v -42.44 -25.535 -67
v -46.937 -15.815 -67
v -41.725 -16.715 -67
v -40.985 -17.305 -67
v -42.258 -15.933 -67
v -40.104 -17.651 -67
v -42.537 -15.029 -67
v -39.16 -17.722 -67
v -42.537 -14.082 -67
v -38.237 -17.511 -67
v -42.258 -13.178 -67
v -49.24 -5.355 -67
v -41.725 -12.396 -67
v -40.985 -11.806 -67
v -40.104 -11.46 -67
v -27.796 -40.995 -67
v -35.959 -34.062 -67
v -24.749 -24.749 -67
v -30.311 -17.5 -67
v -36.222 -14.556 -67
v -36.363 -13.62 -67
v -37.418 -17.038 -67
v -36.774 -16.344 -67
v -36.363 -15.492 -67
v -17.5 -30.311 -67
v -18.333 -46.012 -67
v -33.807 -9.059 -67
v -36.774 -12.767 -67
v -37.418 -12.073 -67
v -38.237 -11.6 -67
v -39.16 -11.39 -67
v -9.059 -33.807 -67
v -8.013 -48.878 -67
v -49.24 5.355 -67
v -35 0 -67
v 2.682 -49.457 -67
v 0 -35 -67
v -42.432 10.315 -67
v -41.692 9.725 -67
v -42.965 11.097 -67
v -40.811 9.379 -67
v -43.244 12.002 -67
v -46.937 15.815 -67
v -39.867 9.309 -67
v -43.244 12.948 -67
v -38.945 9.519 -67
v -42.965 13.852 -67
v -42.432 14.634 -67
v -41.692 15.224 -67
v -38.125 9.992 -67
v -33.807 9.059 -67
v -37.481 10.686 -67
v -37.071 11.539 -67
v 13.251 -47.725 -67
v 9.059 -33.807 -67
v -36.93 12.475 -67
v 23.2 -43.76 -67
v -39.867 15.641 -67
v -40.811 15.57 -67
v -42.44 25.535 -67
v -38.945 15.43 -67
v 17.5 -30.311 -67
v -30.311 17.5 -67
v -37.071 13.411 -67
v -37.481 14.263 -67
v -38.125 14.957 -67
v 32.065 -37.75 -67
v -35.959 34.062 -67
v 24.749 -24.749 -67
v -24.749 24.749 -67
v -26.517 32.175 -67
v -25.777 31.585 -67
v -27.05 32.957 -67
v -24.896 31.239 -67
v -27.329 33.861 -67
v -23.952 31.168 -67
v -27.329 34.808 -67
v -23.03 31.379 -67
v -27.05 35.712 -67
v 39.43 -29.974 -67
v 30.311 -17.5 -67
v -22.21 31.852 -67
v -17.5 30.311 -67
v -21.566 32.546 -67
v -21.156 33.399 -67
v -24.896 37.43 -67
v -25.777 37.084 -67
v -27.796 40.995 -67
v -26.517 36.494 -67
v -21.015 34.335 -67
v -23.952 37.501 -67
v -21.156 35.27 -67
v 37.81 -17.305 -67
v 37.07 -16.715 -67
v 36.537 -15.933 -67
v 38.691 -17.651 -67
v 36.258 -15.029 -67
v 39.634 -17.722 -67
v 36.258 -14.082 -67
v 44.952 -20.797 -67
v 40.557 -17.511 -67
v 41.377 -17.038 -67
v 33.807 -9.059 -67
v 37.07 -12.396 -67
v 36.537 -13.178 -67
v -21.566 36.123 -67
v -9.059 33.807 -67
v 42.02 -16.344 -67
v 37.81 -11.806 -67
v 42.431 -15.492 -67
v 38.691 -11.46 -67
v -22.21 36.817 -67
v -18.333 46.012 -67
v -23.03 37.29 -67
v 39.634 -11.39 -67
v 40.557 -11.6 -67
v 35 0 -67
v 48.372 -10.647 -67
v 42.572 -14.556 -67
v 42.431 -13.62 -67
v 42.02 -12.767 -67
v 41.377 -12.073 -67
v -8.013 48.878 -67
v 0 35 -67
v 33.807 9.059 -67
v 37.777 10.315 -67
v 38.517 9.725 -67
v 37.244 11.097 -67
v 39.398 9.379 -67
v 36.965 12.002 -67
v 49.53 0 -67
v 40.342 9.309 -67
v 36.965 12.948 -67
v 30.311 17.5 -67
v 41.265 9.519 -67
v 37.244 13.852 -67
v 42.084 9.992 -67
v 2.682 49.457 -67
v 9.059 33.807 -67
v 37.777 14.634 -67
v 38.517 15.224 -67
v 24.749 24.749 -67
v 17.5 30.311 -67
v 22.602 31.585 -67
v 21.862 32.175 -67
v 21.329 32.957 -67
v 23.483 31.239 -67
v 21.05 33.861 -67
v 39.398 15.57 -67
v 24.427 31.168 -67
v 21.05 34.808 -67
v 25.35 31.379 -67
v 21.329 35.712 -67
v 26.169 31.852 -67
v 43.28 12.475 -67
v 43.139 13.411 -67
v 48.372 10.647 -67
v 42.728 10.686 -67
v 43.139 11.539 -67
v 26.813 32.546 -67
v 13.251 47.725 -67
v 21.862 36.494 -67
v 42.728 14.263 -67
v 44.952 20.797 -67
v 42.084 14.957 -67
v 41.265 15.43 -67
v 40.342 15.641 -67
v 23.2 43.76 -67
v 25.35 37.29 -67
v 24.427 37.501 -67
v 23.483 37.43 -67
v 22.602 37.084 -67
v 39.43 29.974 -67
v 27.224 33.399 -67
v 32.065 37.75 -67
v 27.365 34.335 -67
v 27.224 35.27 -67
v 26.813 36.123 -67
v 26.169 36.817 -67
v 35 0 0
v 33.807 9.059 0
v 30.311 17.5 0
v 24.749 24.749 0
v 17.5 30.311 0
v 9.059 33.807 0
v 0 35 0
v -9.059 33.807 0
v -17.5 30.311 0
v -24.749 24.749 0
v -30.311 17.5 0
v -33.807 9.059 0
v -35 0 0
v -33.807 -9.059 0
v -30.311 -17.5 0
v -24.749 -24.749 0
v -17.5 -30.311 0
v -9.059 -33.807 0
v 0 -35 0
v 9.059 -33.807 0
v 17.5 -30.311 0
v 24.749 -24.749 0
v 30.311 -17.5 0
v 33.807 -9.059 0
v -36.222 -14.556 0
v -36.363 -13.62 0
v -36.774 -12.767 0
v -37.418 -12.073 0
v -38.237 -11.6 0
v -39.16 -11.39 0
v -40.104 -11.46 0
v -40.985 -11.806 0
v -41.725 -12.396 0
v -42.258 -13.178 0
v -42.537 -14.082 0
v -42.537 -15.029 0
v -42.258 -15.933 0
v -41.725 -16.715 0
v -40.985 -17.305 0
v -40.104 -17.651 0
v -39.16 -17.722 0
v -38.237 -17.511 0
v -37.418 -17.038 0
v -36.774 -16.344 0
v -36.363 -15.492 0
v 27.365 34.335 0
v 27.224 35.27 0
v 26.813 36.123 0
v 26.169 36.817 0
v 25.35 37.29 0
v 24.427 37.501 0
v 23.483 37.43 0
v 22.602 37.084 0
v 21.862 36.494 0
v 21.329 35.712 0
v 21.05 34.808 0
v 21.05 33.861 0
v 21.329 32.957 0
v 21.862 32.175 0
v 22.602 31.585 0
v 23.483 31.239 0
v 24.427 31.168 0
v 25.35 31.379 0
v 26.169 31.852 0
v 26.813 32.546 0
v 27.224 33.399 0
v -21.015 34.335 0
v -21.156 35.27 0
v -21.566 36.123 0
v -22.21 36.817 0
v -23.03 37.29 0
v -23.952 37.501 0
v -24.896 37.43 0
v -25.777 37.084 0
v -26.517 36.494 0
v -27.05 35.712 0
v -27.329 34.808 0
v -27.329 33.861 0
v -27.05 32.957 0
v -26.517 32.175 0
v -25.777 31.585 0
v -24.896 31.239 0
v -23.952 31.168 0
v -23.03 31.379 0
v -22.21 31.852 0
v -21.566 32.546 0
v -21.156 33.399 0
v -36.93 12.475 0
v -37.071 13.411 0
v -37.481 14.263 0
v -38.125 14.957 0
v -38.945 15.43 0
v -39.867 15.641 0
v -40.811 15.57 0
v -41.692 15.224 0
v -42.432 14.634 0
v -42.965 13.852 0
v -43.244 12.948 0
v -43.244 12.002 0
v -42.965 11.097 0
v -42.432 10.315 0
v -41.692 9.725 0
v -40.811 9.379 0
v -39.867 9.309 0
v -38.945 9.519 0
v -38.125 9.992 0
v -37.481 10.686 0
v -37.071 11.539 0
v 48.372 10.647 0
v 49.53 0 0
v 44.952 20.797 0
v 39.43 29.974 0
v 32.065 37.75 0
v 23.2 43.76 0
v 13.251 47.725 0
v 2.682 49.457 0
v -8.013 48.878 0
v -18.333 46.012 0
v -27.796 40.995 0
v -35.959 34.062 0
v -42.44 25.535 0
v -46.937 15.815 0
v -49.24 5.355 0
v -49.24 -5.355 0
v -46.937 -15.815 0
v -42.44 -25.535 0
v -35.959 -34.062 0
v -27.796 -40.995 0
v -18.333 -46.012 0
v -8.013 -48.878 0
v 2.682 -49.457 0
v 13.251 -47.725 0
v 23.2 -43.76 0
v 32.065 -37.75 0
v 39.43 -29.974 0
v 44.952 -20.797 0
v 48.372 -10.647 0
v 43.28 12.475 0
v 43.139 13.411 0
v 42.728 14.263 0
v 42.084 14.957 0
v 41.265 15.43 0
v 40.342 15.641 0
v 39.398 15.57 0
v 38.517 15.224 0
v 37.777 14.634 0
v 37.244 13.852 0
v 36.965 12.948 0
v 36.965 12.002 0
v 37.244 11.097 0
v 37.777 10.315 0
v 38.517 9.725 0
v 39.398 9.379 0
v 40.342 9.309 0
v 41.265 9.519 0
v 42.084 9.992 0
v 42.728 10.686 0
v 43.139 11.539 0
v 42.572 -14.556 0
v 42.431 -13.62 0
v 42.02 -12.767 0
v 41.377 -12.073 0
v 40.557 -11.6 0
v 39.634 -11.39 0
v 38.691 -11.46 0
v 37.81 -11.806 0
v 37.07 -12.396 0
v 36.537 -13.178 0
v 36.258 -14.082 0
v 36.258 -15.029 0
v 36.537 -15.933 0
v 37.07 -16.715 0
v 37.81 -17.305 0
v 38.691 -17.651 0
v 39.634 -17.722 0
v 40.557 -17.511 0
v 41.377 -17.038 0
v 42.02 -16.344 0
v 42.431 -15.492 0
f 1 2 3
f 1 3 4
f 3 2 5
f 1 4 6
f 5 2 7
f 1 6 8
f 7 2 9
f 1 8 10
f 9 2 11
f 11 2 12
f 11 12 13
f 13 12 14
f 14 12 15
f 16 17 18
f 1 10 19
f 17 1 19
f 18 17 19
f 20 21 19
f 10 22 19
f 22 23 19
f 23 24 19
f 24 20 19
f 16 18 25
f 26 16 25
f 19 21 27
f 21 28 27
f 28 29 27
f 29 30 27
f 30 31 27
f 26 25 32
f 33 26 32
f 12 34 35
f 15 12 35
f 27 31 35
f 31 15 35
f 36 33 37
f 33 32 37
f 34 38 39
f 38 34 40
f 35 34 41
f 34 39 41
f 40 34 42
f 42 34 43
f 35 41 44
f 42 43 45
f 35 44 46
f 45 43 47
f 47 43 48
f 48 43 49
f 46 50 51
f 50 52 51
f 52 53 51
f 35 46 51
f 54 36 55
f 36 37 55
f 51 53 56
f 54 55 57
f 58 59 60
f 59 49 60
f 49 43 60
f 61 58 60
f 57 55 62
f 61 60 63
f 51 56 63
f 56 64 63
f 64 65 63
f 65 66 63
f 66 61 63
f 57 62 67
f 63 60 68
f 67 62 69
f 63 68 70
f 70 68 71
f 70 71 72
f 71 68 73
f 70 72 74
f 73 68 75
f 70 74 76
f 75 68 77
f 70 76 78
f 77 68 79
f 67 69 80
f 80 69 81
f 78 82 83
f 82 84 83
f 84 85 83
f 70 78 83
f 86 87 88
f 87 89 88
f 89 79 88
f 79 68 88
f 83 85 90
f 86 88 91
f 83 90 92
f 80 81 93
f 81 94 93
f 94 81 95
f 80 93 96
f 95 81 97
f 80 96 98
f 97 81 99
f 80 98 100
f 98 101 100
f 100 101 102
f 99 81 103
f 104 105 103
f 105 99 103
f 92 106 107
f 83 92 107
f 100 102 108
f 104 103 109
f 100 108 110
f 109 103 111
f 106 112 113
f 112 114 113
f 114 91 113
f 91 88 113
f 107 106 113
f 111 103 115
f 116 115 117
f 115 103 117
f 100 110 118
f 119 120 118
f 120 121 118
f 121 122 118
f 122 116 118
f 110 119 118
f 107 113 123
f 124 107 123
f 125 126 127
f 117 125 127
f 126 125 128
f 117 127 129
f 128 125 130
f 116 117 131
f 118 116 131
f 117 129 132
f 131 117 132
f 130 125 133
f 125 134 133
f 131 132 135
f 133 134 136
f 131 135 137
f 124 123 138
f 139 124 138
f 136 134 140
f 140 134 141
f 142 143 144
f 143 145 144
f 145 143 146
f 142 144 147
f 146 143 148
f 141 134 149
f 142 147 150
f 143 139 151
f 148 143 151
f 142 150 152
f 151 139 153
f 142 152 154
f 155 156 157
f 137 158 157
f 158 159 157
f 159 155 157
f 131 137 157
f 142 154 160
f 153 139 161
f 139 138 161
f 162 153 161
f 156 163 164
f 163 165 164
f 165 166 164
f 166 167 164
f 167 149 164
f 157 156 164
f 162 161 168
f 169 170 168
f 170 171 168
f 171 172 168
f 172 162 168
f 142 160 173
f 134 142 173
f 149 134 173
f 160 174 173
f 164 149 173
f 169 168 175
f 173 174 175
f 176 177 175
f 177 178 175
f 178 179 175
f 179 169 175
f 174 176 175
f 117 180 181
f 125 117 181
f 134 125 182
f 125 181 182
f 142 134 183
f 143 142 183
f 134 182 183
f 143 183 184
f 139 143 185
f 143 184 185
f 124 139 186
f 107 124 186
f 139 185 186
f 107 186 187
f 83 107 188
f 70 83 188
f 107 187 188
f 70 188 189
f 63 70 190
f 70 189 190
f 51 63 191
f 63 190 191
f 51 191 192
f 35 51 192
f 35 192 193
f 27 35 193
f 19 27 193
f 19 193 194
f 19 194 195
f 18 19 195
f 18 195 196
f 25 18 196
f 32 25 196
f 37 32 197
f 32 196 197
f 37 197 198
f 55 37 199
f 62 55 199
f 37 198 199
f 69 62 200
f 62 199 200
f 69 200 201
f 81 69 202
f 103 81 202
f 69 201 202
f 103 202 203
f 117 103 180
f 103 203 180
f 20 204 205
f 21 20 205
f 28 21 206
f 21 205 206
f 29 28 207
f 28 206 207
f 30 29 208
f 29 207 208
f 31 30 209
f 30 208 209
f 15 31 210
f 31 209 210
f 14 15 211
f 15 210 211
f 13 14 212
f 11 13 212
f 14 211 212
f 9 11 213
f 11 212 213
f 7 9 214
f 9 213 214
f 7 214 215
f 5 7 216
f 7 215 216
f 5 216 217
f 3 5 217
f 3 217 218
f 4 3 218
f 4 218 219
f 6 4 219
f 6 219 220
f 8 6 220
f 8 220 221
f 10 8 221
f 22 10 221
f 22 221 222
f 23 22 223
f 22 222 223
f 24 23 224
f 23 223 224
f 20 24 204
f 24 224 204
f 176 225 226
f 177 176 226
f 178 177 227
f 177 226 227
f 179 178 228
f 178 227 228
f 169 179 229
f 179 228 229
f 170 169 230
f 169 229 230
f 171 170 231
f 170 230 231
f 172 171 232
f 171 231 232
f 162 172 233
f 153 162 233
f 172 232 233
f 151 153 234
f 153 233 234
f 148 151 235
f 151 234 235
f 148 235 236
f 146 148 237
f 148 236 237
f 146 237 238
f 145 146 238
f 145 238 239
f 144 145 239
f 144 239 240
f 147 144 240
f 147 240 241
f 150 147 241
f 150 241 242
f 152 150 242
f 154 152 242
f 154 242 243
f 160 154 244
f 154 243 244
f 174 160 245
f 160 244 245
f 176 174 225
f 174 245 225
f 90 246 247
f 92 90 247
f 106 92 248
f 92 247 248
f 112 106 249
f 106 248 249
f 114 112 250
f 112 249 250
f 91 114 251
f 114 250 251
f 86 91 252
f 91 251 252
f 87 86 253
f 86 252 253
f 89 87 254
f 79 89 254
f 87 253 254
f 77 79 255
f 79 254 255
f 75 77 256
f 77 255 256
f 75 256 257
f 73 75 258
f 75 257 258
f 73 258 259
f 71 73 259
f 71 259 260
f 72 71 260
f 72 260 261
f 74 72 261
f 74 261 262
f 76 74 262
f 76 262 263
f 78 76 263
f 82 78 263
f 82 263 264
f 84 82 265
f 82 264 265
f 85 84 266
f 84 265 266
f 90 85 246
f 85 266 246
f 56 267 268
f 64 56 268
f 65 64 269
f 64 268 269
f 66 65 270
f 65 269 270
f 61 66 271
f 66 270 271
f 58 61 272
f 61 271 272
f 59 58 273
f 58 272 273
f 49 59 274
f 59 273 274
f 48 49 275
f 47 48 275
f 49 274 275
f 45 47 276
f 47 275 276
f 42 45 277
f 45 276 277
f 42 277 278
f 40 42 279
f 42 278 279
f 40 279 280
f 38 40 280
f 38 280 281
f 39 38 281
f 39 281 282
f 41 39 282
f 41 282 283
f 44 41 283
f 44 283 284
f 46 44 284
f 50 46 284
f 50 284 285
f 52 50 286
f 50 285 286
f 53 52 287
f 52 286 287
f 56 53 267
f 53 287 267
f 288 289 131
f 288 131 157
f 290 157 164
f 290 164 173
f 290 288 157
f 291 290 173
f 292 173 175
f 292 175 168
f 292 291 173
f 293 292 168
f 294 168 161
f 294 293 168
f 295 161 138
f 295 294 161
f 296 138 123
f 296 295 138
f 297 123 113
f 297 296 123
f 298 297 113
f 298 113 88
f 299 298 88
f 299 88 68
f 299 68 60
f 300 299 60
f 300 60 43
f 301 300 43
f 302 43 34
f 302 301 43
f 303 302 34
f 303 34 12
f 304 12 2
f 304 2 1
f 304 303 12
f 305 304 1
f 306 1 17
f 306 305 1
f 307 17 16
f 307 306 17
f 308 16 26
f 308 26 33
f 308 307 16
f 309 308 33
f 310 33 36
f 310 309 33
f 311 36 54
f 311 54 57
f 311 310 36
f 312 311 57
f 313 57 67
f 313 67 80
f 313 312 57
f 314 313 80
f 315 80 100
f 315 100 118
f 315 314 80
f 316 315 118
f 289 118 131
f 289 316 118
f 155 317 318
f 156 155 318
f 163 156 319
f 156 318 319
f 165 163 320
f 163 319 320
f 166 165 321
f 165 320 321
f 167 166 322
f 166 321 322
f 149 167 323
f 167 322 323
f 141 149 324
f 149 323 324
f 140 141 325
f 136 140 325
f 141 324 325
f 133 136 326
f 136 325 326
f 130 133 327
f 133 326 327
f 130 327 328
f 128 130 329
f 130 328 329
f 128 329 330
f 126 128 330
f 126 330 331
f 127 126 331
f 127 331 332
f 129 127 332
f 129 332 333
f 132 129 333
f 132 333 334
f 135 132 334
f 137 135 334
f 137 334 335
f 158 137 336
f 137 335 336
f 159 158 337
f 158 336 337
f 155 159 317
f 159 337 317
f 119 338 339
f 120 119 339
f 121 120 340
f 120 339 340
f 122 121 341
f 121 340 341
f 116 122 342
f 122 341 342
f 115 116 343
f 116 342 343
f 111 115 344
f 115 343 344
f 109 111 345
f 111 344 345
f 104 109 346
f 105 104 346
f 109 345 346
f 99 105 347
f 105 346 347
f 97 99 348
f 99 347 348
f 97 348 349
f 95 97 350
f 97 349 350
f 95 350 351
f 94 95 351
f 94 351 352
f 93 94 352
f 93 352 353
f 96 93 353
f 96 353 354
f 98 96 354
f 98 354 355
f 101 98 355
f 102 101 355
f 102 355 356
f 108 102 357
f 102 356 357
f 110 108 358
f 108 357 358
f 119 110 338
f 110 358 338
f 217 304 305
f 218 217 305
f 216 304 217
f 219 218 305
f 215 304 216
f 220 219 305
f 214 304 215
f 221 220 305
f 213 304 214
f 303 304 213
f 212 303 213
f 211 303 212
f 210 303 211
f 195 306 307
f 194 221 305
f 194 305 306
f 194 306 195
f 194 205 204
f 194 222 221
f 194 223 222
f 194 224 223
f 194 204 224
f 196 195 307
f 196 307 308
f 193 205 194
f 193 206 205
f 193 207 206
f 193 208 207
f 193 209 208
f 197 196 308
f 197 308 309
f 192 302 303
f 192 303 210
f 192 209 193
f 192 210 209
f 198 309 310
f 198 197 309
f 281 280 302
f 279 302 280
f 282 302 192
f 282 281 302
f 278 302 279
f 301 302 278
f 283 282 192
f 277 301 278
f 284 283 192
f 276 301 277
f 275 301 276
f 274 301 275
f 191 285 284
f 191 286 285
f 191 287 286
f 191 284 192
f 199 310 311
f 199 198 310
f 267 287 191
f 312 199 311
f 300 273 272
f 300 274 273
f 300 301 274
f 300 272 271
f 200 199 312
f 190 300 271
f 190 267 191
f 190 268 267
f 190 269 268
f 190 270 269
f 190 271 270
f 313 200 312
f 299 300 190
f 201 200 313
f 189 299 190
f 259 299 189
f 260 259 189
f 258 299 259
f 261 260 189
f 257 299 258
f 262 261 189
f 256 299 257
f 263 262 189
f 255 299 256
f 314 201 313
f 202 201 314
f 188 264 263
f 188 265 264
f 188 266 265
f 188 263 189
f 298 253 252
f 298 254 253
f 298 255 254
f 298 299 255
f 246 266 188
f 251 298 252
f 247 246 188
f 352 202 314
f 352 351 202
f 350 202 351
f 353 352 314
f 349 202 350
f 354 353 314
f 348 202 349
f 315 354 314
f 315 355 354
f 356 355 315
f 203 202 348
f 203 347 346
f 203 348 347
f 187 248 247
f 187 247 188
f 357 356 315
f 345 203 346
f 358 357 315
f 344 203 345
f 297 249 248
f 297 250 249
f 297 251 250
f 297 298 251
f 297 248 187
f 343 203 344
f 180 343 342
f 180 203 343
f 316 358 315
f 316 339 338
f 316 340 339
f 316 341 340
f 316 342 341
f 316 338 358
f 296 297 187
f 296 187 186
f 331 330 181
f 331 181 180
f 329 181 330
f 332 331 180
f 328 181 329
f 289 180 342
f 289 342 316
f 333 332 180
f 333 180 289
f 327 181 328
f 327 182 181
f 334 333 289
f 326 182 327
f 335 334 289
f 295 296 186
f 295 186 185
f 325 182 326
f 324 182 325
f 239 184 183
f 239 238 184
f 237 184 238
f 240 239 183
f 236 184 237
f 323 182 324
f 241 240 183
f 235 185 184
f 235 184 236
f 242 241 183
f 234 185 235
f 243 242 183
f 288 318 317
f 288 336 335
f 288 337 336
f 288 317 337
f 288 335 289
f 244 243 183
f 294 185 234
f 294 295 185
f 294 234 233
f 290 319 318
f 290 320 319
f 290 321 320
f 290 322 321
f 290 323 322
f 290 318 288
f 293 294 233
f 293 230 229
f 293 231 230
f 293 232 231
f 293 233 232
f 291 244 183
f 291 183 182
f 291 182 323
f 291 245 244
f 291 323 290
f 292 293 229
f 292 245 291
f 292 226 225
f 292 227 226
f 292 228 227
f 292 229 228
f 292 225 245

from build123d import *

# Parameters (mm, degrees)
SKETCH1_R           = 49.53
SKETCH1_R_2         = 3.175
SKETCH1_R_3         = 35
BOSS_EXTRUDE1_DEPTH = 67


with BuildPart() as part:
    # Sketch1 → Boss-Extrude1 (new body)
    with BuildSketch(Plane.XY):
        Circle(SKETCH1_R)
        with Locations((-39.397117561, -14.555656215)):
            Circle(SKETCH1_R_2, mode=Mode.SUBTRACT)
        Circle(SKETCH1_R_3, mode=Mode.SUBTRACT)
        with Locations((39.397117561, -14.555656215)):
            Circle(SKETCH1_R_2, mode=Mode.SUBTRACT)
        with Locations((-40.104626484, 12.474731845)):
            Circle(SKETCH1_R_2, mode=Mode.SUBTRACT)
        with Locations((-24.189576015, 34.334594977)):
            Circle(SKETCH1_R_2, mode=Mode.SUBTRACT)
        with Locations((40.104626484, 12.474731845)):
            Circle(SKETCH1_R_2, mode=Mode.SUBTRACT)
        with Locations((24.189576015, 34.334594977)):
            Circle(SKETCH1_R_2, mode=Mode.SUBTRACT)
    extrude(amount=-BOSS_EXTRUDE1_DEPTH)


solid = part.part
